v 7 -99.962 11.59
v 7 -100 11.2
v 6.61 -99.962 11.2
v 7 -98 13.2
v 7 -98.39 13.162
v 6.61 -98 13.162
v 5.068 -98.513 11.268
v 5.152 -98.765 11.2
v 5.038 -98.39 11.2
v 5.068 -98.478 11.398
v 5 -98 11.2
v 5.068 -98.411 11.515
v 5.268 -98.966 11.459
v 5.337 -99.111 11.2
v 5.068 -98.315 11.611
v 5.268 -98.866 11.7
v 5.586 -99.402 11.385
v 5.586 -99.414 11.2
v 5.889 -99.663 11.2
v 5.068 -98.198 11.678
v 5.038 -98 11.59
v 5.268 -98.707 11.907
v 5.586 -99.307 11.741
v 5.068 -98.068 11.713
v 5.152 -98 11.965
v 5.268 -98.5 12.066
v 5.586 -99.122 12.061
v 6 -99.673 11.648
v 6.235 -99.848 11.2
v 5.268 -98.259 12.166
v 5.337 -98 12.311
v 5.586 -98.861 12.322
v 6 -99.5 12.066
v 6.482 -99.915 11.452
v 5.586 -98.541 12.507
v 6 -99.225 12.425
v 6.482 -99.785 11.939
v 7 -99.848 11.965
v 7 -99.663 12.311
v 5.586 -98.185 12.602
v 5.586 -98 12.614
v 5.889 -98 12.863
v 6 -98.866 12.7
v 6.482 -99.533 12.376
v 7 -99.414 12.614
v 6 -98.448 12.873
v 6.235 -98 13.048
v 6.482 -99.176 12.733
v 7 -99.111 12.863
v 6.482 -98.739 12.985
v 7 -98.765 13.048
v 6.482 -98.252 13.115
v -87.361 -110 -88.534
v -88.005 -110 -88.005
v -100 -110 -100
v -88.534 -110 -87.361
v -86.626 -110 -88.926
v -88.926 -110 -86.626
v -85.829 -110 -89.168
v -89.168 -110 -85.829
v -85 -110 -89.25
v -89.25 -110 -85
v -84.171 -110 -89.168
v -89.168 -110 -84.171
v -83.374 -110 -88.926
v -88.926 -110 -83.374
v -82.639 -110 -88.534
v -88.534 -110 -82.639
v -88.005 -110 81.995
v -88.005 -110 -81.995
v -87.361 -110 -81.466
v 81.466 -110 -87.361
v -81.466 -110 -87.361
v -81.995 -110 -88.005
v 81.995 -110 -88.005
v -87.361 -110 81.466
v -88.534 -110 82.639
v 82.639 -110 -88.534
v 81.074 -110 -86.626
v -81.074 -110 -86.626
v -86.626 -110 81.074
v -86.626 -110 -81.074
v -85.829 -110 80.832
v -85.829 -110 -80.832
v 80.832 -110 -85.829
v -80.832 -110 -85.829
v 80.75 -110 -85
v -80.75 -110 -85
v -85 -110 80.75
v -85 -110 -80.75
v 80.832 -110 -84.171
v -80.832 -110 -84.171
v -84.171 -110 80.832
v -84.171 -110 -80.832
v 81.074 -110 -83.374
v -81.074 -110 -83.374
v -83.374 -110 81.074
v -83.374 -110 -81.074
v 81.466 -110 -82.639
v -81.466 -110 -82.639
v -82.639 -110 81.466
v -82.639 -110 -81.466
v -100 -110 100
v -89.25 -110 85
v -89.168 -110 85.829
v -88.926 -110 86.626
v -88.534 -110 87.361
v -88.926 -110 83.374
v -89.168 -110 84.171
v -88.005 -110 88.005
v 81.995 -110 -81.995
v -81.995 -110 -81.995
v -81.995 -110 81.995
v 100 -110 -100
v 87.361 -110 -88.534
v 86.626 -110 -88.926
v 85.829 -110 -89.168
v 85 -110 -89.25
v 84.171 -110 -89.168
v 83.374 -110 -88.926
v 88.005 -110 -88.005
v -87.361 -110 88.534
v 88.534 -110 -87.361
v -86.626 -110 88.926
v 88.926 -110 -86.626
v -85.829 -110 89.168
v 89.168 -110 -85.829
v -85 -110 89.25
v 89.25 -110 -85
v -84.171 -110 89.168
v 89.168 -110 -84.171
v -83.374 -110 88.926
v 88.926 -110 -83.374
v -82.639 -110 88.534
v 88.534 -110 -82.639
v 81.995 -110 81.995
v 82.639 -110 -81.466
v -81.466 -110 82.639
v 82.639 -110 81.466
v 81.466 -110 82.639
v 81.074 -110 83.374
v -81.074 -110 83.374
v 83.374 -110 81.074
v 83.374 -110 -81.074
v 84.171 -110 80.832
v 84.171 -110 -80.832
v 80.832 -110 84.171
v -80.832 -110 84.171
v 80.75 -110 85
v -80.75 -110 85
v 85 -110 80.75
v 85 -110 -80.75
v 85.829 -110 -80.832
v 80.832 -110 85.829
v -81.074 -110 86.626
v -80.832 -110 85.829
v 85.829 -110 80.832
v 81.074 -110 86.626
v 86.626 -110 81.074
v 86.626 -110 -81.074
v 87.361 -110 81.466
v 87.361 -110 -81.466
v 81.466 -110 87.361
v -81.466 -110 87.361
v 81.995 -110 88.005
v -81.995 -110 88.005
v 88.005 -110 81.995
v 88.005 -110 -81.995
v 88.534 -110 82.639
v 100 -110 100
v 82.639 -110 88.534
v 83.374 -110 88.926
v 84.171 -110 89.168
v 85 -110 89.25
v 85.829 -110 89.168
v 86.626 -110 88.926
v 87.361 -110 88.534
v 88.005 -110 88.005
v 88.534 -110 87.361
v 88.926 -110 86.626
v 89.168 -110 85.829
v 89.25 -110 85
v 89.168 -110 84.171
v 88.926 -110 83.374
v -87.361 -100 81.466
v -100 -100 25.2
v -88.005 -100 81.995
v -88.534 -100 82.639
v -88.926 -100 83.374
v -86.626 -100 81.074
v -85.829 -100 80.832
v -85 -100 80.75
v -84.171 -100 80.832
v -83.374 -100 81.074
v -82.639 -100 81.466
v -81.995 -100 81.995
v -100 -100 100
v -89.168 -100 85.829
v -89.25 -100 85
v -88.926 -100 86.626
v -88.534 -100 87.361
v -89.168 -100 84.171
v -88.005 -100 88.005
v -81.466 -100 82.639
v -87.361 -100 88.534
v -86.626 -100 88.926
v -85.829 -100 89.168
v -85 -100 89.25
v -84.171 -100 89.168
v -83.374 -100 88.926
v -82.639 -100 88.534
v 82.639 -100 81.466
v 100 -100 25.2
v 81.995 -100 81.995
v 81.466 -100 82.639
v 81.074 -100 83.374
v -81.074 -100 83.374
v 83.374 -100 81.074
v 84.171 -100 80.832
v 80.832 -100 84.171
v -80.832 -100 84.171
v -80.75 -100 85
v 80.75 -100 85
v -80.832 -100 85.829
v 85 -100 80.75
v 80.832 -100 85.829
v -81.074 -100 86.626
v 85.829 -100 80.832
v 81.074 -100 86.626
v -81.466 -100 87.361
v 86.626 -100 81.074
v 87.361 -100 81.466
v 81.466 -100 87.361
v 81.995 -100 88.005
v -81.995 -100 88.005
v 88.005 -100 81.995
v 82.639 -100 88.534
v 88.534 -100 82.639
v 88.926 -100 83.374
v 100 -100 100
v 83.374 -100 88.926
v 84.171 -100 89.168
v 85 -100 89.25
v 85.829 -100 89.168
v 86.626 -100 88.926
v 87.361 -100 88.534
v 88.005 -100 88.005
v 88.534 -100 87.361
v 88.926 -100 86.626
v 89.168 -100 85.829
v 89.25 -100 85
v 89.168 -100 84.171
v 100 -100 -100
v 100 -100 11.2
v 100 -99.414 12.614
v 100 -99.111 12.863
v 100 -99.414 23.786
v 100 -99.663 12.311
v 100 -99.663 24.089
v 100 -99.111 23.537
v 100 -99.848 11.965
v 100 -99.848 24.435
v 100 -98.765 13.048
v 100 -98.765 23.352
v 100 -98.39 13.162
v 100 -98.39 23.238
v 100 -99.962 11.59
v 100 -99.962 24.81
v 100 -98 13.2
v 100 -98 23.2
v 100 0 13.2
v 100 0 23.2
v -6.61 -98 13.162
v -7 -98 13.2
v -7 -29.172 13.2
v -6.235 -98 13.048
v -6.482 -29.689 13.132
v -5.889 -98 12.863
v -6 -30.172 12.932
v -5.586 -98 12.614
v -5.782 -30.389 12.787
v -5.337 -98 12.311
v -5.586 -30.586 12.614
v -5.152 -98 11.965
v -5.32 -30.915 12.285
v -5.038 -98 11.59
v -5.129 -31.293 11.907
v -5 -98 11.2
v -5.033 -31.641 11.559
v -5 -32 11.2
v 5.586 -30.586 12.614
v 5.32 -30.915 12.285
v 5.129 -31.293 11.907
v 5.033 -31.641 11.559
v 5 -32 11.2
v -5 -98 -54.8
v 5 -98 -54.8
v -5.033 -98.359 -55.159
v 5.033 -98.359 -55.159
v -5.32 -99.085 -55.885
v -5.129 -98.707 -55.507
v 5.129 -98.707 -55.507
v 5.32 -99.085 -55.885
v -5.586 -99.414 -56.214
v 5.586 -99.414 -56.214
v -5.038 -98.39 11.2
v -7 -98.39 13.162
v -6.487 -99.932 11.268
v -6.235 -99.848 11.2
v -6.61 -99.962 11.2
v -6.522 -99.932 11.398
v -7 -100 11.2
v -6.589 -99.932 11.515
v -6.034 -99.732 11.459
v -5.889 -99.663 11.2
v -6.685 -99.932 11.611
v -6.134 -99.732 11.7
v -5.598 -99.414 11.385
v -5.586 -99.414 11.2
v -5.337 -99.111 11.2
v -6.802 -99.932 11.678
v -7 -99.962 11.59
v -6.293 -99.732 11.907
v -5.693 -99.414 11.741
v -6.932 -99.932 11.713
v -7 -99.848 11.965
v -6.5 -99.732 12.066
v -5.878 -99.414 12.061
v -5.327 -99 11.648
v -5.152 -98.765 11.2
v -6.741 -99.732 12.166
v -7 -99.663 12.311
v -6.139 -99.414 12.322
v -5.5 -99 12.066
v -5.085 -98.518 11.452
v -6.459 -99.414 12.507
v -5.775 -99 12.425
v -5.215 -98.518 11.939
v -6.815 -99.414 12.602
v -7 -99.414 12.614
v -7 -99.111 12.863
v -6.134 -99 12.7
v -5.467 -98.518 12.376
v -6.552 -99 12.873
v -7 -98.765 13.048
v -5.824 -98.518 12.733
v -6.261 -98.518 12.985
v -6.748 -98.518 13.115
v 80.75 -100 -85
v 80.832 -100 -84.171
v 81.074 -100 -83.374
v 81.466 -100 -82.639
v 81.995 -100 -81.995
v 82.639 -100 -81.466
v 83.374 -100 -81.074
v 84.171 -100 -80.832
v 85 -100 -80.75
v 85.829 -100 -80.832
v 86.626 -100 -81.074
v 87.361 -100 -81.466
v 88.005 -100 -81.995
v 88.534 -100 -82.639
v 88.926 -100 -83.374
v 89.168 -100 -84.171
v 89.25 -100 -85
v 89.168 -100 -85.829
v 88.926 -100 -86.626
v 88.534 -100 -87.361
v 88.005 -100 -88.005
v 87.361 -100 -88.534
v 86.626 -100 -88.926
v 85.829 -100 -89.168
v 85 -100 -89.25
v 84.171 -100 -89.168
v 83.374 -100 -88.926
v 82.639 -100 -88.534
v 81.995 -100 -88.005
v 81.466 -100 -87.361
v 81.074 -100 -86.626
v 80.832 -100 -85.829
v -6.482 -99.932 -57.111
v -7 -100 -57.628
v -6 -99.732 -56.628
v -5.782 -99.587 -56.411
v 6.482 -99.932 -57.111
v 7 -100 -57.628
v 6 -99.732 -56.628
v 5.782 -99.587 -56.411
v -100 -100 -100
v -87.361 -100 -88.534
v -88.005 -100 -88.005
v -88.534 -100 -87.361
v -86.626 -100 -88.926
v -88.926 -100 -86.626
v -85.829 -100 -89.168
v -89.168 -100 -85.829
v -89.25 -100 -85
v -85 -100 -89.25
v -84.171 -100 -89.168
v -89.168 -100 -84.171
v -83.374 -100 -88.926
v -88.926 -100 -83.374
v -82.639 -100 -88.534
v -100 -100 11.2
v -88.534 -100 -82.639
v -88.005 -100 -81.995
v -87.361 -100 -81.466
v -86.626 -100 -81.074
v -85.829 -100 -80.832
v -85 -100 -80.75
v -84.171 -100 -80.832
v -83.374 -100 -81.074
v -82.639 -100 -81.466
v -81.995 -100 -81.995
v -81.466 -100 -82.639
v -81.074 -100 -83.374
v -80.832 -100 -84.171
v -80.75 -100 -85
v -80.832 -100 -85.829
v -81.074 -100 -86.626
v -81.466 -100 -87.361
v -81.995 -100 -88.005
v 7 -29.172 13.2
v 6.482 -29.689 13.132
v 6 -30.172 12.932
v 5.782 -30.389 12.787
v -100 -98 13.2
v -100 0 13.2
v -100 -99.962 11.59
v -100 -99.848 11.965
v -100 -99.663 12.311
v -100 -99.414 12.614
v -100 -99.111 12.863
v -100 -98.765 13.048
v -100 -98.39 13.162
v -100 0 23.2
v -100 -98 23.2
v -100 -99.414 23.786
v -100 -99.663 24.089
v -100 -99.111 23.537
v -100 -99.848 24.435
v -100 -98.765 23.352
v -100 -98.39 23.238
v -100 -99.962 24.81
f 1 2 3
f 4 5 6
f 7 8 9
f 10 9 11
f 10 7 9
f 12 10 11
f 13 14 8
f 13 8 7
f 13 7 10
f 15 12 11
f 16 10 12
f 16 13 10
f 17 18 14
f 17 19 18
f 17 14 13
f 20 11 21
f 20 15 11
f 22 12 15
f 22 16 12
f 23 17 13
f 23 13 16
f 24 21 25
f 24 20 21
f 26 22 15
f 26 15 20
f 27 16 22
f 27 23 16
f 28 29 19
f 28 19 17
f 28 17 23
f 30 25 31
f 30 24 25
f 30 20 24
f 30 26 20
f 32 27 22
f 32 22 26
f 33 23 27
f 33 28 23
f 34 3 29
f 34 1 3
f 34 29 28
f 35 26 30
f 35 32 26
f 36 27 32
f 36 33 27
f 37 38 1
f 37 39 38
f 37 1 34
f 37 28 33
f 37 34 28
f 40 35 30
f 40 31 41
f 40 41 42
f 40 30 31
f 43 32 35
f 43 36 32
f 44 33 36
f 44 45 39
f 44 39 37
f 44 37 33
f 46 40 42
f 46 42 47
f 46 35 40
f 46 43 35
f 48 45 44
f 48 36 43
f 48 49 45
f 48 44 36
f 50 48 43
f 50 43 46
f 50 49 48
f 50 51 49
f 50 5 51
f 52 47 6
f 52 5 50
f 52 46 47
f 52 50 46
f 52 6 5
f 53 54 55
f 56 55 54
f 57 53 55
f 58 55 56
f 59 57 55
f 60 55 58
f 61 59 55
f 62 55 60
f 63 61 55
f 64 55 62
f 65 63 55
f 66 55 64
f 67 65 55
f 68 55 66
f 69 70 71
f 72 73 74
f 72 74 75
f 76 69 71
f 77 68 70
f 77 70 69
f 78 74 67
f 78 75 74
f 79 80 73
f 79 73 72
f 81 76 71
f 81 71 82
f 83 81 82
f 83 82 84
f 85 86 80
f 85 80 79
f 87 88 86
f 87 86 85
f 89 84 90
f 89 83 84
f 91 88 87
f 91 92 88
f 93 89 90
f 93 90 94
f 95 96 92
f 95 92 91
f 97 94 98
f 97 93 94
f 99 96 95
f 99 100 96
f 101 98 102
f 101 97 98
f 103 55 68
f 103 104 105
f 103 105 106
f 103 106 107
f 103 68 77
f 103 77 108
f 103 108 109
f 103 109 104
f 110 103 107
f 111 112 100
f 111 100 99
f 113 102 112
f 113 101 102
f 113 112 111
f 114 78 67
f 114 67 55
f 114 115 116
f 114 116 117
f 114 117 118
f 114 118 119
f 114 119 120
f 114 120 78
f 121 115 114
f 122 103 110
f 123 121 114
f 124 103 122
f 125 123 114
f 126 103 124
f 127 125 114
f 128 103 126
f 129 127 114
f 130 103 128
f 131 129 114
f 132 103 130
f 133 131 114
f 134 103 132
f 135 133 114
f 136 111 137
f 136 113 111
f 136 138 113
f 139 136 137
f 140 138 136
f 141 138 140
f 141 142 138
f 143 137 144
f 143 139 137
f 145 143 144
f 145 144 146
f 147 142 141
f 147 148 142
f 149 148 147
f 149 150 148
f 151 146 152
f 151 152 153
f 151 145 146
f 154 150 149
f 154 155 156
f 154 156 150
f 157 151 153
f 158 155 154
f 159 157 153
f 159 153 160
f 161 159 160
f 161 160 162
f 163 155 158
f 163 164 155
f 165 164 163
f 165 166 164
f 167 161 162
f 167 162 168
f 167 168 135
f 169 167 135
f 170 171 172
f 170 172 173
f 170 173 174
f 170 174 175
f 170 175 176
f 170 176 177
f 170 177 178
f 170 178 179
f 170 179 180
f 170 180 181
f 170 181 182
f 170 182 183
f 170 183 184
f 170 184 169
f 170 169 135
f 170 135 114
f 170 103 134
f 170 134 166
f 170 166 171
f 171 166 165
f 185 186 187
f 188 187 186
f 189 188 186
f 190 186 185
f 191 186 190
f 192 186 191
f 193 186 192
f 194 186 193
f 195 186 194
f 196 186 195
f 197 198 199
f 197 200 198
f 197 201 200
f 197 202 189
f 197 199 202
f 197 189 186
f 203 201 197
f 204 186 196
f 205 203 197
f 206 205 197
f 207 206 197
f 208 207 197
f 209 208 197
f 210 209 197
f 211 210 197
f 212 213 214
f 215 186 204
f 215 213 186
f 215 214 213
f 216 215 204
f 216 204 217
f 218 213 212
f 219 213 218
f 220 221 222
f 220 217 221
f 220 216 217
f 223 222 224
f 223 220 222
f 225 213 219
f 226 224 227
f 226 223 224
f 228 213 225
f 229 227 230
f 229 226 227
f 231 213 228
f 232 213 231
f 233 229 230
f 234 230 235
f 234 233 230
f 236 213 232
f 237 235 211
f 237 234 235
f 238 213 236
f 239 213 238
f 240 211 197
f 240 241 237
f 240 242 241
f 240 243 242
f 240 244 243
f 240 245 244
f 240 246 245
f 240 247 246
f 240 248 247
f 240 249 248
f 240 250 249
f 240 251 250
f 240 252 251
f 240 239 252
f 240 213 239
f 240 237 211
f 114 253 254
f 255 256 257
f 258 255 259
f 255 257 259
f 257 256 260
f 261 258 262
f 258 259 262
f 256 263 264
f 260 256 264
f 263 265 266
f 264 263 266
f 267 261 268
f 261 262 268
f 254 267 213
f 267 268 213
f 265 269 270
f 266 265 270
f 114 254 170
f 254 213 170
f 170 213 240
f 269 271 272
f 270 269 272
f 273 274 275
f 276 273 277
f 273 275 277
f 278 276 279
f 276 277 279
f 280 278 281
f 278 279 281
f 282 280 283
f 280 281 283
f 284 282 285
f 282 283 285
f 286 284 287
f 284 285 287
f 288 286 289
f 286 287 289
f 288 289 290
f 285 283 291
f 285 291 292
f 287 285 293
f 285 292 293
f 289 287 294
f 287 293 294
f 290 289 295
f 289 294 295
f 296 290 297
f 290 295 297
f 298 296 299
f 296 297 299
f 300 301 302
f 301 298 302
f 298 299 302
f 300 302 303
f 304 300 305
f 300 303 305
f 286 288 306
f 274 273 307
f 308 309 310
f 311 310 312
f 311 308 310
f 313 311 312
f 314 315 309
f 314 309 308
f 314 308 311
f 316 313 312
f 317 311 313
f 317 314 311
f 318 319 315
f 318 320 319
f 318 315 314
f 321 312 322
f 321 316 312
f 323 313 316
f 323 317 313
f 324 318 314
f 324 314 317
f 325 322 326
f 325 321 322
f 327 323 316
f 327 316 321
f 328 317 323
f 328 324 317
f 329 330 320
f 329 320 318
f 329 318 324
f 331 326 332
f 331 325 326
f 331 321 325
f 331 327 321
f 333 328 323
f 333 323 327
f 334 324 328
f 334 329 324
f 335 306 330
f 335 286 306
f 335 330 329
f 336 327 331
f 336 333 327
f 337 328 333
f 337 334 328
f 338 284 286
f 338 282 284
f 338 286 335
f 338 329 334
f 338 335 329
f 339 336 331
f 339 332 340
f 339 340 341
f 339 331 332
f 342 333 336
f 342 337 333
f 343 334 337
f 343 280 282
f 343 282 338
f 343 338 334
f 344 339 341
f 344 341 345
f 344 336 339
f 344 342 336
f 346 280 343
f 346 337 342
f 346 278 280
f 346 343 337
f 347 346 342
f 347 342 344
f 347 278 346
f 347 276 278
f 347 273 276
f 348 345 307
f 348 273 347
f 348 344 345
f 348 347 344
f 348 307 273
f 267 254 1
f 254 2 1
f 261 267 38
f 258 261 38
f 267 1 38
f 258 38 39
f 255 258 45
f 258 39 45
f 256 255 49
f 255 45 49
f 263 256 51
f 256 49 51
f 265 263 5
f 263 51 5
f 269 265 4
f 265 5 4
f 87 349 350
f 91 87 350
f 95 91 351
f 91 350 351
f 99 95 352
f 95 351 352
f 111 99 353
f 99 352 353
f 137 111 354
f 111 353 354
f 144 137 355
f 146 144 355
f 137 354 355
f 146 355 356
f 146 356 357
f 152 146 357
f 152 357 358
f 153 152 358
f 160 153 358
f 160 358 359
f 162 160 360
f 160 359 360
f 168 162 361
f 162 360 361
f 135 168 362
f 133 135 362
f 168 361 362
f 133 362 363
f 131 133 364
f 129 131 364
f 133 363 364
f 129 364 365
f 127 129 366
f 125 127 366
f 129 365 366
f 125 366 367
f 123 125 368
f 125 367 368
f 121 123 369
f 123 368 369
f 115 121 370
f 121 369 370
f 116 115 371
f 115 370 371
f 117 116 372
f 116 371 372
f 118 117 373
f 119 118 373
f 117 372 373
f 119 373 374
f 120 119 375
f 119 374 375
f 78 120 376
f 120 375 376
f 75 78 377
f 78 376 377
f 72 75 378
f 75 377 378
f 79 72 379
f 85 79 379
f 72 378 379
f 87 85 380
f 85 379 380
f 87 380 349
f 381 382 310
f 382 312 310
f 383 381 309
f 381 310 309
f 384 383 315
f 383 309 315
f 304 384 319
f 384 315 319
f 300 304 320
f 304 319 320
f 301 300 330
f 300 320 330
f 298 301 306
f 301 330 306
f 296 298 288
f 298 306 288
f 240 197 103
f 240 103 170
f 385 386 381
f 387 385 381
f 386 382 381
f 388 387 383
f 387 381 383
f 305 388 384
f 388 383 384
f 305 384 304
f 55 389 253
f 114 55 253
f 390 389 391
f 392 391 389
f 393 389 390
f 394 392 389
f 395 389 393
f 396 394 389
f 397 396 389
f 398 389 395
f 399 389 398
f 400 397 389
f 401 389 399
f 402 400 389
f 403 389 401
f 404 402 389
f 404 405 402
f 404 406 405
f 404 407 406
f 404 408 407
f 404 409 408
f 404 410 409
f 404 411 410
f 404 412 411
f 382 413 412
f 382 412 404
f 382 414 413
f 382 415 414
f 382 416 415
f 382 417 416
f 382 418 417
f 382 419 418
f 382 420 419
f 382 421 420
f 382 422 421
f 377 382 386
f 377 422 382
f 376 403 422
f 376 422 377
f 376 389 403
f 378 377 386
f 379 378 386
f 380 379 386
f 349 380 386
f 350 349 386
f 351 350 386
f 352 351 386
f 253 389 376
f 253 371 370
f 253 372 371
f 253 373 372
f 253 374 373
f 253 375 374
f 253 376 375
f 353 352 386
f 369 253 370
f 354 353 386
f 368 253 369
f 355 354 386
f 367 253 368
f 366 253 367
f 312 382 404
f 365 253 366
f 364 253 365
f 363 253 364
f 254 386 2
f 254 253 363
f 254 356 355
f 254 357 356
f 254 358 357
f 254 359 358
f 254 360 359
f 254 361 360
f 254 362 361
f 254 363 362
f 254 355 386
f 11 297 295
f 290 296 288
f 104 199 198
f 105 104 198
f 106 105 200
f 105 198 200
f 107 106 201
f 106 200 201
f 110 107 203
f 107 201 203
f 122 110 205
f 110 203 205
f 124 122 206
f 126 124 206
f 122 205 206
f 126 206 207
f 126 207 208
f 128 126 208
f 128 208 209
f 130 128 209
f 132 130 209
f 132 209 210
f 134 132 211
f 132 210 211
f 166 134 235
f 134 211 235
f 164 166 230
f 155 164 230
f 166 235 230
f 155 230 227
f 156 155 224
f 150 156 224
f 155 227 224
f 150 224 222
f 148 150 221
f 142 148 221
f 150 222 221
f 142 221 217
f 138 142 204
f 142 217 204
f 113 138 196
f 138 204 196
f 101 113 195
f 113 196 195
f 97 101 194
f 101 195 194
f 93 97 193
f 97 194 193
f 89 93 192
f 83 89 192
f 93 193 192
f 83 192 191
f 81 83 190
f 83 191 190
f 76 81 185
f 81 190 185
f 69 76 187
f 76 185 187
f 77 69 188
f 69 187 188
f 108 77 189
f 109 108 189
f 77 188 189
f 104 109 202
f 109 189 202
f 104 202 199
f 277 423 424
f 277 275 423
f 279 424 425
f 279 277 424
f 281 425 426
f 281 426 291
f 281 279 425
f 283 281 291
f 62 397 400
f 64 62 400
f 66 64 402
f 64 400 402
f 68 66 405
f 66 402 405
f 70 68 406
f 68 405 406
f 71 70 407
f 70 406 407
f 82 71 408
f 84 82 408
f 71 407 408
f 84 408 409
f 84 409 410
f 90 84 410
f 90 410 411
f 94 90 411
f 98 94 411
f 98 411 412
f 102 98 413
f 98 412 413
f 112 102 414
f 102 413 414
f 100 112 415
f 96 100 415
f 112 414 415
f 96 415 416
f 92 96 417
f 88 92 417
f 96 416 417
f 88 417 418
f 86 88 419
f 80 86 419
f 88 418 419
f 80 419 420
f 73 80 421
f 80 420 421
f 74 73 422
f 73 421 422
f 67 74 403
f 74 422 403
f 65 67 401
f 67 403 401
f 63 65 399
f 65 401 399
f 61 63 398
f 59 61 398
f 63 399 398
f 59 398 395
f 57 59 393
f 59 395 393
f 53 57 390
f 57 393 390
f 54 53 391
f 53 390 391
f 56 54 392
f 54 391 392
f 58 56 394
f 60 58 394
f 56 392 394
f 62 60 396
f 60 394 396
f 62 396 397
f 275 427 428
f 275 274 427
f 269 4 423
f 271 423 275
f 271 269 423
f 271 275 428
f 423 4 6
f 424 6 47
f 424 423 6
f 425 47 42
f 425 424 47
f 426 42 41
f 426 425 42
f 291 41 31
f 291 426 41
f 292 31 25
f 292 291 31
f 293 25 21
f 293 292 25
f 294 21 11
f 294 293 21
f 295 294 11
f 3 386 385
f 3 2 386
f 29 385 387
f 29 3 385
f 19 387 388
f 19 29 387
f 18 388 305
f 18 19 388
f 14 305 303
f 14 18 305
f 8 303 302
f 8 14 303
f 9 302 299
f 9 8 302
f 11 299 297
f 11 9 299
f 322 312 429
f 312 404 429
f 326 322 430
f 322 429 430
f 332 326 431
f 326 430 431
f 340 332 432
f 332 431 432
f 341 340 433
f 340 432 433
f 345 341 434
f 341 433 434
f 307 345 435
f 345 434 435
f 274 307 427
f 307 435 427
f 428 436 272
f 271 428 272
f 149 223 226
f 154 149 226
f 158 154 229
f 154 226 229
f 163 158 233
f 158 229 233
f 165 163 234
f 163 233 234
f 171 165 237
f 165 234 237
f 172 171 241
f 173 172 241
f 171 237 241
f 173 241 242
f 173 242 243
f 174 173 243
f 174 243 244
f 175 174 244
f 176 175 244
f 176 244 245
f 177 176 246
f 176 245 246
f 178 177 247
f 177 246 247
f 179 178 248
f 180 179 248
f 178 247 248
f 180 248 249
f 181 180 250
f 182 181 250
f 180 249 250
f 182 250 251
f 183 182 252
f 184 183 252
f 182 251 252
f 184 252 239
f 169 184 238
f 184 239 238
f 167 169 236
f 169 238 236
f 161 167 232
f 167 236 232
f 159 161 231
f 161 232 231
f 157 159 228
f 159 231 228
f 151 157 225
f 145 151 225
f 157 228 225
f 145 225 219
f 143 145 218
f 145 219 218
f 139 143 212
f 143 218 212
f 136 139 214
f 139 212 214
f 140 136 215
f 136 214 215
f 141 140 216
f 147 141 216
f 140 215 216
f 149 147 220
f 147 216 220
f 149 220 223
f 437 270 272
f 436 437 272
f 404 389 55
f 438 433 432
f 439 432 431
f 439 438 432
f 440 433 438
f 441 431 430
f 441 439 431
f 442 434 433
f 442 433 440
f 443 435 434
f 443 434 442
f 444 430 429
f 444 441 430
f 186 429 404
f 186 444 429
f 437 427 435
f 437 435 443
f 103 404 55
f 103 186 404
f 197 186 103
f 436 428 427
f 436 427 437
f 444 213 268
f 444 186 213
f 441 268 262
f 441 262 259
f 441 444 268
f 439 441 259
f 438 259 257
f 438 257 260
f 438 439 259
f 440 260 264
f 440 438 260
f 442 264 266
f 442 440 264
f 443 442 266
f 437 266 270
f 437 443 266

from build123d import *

# Parameters (mm, degrees)
F0_W     = 200
F0_H     = 200
F1_DEPTH = 110
F2_W     = 100
F2_H     = 76.8
F2_H_2   = 113.2
F3_DEPTH = 200
F4_W     = 10
F4_H     = 70
F5_DEPTH = 100
F7_DEPTH = 200
F8_R     = 4.25
F9_DEPTH = 10
F10_R    = 2


with BuildPart() as f1:
    # F0 (on Front) → F1 (new body)
    with BuildSketch(Plane.XZ):
        Rectangle(F0_W, F0_H)
    extrude(amount=F1_DEPTH)

    # F2 (on face) → F3 (cut)
    with BuildSketch(Plane.YZ.offset(100)):
        with Locations((-50, 61.6)):
            Rectangle(F2_W, F2_H)
        with Locations((-50, -43.4)):
            Rectangle(F2_W, F2_H_2)
    extrude(amount=-F3_DEPTH, mode=Mode.SUBTRACT)

    # F4 (on face) → F5 (join)
    with BuildSketch(Plane(origin=(0, -100, 0), x_dir=(-1, 0, 0), z_dir=(0, 1, 0))):
        with Locations((0, -21.8)):
            Rectangle(F4_W, F4_H)
    extrude(amount=F5_DEPTH)

    # F6 (on face) → F7 (cut)
    with BuildSketch(Plane.YZ.offset(5)):
        Polygon((0, 13.2), (-30, 13.2), (-100, -56.8), (0, -56.8), align=None)
    extrude(amount=-F7_DEPTH, mode=Mode.SUBTRACT)

    # F8 (on face) → F9 (cut)
    with BuildSketch(Plane(origin=(0, -100, 0), x_dir=(-1, 0, 0), z_dir=(0, 1, 0))):
        with Locations((-85, 85)):
            Circle(F8_R)
        with Locations((85, 85)):
            Circle(F8_R)
        with Locations((85, -85)):
            Circle(F8_R)
        with Locations((-85, -85)):
            Circle(F8_R)
    extrude(amount=-F9_DEPTH, mode=Mode.SUBTRACT)

    # F10
    f10_edges = [f1.edges().sort_by_distance(p)[0] for p in [
        (0, -100, 23.2),
        (52.5, -100, 13.2),
        (5, -100, -21.8),
        (5, -65, 13.2),
        (0, -30, 13.2),
        (0, -100, -56.8),
        (-5, -65, 13.2),
        (-5, -100, -21.8),
        (-52.5, -100, 13.2),
    ]]
    fillet(f10_edges, radius=F10_R)


solid = f1.part
